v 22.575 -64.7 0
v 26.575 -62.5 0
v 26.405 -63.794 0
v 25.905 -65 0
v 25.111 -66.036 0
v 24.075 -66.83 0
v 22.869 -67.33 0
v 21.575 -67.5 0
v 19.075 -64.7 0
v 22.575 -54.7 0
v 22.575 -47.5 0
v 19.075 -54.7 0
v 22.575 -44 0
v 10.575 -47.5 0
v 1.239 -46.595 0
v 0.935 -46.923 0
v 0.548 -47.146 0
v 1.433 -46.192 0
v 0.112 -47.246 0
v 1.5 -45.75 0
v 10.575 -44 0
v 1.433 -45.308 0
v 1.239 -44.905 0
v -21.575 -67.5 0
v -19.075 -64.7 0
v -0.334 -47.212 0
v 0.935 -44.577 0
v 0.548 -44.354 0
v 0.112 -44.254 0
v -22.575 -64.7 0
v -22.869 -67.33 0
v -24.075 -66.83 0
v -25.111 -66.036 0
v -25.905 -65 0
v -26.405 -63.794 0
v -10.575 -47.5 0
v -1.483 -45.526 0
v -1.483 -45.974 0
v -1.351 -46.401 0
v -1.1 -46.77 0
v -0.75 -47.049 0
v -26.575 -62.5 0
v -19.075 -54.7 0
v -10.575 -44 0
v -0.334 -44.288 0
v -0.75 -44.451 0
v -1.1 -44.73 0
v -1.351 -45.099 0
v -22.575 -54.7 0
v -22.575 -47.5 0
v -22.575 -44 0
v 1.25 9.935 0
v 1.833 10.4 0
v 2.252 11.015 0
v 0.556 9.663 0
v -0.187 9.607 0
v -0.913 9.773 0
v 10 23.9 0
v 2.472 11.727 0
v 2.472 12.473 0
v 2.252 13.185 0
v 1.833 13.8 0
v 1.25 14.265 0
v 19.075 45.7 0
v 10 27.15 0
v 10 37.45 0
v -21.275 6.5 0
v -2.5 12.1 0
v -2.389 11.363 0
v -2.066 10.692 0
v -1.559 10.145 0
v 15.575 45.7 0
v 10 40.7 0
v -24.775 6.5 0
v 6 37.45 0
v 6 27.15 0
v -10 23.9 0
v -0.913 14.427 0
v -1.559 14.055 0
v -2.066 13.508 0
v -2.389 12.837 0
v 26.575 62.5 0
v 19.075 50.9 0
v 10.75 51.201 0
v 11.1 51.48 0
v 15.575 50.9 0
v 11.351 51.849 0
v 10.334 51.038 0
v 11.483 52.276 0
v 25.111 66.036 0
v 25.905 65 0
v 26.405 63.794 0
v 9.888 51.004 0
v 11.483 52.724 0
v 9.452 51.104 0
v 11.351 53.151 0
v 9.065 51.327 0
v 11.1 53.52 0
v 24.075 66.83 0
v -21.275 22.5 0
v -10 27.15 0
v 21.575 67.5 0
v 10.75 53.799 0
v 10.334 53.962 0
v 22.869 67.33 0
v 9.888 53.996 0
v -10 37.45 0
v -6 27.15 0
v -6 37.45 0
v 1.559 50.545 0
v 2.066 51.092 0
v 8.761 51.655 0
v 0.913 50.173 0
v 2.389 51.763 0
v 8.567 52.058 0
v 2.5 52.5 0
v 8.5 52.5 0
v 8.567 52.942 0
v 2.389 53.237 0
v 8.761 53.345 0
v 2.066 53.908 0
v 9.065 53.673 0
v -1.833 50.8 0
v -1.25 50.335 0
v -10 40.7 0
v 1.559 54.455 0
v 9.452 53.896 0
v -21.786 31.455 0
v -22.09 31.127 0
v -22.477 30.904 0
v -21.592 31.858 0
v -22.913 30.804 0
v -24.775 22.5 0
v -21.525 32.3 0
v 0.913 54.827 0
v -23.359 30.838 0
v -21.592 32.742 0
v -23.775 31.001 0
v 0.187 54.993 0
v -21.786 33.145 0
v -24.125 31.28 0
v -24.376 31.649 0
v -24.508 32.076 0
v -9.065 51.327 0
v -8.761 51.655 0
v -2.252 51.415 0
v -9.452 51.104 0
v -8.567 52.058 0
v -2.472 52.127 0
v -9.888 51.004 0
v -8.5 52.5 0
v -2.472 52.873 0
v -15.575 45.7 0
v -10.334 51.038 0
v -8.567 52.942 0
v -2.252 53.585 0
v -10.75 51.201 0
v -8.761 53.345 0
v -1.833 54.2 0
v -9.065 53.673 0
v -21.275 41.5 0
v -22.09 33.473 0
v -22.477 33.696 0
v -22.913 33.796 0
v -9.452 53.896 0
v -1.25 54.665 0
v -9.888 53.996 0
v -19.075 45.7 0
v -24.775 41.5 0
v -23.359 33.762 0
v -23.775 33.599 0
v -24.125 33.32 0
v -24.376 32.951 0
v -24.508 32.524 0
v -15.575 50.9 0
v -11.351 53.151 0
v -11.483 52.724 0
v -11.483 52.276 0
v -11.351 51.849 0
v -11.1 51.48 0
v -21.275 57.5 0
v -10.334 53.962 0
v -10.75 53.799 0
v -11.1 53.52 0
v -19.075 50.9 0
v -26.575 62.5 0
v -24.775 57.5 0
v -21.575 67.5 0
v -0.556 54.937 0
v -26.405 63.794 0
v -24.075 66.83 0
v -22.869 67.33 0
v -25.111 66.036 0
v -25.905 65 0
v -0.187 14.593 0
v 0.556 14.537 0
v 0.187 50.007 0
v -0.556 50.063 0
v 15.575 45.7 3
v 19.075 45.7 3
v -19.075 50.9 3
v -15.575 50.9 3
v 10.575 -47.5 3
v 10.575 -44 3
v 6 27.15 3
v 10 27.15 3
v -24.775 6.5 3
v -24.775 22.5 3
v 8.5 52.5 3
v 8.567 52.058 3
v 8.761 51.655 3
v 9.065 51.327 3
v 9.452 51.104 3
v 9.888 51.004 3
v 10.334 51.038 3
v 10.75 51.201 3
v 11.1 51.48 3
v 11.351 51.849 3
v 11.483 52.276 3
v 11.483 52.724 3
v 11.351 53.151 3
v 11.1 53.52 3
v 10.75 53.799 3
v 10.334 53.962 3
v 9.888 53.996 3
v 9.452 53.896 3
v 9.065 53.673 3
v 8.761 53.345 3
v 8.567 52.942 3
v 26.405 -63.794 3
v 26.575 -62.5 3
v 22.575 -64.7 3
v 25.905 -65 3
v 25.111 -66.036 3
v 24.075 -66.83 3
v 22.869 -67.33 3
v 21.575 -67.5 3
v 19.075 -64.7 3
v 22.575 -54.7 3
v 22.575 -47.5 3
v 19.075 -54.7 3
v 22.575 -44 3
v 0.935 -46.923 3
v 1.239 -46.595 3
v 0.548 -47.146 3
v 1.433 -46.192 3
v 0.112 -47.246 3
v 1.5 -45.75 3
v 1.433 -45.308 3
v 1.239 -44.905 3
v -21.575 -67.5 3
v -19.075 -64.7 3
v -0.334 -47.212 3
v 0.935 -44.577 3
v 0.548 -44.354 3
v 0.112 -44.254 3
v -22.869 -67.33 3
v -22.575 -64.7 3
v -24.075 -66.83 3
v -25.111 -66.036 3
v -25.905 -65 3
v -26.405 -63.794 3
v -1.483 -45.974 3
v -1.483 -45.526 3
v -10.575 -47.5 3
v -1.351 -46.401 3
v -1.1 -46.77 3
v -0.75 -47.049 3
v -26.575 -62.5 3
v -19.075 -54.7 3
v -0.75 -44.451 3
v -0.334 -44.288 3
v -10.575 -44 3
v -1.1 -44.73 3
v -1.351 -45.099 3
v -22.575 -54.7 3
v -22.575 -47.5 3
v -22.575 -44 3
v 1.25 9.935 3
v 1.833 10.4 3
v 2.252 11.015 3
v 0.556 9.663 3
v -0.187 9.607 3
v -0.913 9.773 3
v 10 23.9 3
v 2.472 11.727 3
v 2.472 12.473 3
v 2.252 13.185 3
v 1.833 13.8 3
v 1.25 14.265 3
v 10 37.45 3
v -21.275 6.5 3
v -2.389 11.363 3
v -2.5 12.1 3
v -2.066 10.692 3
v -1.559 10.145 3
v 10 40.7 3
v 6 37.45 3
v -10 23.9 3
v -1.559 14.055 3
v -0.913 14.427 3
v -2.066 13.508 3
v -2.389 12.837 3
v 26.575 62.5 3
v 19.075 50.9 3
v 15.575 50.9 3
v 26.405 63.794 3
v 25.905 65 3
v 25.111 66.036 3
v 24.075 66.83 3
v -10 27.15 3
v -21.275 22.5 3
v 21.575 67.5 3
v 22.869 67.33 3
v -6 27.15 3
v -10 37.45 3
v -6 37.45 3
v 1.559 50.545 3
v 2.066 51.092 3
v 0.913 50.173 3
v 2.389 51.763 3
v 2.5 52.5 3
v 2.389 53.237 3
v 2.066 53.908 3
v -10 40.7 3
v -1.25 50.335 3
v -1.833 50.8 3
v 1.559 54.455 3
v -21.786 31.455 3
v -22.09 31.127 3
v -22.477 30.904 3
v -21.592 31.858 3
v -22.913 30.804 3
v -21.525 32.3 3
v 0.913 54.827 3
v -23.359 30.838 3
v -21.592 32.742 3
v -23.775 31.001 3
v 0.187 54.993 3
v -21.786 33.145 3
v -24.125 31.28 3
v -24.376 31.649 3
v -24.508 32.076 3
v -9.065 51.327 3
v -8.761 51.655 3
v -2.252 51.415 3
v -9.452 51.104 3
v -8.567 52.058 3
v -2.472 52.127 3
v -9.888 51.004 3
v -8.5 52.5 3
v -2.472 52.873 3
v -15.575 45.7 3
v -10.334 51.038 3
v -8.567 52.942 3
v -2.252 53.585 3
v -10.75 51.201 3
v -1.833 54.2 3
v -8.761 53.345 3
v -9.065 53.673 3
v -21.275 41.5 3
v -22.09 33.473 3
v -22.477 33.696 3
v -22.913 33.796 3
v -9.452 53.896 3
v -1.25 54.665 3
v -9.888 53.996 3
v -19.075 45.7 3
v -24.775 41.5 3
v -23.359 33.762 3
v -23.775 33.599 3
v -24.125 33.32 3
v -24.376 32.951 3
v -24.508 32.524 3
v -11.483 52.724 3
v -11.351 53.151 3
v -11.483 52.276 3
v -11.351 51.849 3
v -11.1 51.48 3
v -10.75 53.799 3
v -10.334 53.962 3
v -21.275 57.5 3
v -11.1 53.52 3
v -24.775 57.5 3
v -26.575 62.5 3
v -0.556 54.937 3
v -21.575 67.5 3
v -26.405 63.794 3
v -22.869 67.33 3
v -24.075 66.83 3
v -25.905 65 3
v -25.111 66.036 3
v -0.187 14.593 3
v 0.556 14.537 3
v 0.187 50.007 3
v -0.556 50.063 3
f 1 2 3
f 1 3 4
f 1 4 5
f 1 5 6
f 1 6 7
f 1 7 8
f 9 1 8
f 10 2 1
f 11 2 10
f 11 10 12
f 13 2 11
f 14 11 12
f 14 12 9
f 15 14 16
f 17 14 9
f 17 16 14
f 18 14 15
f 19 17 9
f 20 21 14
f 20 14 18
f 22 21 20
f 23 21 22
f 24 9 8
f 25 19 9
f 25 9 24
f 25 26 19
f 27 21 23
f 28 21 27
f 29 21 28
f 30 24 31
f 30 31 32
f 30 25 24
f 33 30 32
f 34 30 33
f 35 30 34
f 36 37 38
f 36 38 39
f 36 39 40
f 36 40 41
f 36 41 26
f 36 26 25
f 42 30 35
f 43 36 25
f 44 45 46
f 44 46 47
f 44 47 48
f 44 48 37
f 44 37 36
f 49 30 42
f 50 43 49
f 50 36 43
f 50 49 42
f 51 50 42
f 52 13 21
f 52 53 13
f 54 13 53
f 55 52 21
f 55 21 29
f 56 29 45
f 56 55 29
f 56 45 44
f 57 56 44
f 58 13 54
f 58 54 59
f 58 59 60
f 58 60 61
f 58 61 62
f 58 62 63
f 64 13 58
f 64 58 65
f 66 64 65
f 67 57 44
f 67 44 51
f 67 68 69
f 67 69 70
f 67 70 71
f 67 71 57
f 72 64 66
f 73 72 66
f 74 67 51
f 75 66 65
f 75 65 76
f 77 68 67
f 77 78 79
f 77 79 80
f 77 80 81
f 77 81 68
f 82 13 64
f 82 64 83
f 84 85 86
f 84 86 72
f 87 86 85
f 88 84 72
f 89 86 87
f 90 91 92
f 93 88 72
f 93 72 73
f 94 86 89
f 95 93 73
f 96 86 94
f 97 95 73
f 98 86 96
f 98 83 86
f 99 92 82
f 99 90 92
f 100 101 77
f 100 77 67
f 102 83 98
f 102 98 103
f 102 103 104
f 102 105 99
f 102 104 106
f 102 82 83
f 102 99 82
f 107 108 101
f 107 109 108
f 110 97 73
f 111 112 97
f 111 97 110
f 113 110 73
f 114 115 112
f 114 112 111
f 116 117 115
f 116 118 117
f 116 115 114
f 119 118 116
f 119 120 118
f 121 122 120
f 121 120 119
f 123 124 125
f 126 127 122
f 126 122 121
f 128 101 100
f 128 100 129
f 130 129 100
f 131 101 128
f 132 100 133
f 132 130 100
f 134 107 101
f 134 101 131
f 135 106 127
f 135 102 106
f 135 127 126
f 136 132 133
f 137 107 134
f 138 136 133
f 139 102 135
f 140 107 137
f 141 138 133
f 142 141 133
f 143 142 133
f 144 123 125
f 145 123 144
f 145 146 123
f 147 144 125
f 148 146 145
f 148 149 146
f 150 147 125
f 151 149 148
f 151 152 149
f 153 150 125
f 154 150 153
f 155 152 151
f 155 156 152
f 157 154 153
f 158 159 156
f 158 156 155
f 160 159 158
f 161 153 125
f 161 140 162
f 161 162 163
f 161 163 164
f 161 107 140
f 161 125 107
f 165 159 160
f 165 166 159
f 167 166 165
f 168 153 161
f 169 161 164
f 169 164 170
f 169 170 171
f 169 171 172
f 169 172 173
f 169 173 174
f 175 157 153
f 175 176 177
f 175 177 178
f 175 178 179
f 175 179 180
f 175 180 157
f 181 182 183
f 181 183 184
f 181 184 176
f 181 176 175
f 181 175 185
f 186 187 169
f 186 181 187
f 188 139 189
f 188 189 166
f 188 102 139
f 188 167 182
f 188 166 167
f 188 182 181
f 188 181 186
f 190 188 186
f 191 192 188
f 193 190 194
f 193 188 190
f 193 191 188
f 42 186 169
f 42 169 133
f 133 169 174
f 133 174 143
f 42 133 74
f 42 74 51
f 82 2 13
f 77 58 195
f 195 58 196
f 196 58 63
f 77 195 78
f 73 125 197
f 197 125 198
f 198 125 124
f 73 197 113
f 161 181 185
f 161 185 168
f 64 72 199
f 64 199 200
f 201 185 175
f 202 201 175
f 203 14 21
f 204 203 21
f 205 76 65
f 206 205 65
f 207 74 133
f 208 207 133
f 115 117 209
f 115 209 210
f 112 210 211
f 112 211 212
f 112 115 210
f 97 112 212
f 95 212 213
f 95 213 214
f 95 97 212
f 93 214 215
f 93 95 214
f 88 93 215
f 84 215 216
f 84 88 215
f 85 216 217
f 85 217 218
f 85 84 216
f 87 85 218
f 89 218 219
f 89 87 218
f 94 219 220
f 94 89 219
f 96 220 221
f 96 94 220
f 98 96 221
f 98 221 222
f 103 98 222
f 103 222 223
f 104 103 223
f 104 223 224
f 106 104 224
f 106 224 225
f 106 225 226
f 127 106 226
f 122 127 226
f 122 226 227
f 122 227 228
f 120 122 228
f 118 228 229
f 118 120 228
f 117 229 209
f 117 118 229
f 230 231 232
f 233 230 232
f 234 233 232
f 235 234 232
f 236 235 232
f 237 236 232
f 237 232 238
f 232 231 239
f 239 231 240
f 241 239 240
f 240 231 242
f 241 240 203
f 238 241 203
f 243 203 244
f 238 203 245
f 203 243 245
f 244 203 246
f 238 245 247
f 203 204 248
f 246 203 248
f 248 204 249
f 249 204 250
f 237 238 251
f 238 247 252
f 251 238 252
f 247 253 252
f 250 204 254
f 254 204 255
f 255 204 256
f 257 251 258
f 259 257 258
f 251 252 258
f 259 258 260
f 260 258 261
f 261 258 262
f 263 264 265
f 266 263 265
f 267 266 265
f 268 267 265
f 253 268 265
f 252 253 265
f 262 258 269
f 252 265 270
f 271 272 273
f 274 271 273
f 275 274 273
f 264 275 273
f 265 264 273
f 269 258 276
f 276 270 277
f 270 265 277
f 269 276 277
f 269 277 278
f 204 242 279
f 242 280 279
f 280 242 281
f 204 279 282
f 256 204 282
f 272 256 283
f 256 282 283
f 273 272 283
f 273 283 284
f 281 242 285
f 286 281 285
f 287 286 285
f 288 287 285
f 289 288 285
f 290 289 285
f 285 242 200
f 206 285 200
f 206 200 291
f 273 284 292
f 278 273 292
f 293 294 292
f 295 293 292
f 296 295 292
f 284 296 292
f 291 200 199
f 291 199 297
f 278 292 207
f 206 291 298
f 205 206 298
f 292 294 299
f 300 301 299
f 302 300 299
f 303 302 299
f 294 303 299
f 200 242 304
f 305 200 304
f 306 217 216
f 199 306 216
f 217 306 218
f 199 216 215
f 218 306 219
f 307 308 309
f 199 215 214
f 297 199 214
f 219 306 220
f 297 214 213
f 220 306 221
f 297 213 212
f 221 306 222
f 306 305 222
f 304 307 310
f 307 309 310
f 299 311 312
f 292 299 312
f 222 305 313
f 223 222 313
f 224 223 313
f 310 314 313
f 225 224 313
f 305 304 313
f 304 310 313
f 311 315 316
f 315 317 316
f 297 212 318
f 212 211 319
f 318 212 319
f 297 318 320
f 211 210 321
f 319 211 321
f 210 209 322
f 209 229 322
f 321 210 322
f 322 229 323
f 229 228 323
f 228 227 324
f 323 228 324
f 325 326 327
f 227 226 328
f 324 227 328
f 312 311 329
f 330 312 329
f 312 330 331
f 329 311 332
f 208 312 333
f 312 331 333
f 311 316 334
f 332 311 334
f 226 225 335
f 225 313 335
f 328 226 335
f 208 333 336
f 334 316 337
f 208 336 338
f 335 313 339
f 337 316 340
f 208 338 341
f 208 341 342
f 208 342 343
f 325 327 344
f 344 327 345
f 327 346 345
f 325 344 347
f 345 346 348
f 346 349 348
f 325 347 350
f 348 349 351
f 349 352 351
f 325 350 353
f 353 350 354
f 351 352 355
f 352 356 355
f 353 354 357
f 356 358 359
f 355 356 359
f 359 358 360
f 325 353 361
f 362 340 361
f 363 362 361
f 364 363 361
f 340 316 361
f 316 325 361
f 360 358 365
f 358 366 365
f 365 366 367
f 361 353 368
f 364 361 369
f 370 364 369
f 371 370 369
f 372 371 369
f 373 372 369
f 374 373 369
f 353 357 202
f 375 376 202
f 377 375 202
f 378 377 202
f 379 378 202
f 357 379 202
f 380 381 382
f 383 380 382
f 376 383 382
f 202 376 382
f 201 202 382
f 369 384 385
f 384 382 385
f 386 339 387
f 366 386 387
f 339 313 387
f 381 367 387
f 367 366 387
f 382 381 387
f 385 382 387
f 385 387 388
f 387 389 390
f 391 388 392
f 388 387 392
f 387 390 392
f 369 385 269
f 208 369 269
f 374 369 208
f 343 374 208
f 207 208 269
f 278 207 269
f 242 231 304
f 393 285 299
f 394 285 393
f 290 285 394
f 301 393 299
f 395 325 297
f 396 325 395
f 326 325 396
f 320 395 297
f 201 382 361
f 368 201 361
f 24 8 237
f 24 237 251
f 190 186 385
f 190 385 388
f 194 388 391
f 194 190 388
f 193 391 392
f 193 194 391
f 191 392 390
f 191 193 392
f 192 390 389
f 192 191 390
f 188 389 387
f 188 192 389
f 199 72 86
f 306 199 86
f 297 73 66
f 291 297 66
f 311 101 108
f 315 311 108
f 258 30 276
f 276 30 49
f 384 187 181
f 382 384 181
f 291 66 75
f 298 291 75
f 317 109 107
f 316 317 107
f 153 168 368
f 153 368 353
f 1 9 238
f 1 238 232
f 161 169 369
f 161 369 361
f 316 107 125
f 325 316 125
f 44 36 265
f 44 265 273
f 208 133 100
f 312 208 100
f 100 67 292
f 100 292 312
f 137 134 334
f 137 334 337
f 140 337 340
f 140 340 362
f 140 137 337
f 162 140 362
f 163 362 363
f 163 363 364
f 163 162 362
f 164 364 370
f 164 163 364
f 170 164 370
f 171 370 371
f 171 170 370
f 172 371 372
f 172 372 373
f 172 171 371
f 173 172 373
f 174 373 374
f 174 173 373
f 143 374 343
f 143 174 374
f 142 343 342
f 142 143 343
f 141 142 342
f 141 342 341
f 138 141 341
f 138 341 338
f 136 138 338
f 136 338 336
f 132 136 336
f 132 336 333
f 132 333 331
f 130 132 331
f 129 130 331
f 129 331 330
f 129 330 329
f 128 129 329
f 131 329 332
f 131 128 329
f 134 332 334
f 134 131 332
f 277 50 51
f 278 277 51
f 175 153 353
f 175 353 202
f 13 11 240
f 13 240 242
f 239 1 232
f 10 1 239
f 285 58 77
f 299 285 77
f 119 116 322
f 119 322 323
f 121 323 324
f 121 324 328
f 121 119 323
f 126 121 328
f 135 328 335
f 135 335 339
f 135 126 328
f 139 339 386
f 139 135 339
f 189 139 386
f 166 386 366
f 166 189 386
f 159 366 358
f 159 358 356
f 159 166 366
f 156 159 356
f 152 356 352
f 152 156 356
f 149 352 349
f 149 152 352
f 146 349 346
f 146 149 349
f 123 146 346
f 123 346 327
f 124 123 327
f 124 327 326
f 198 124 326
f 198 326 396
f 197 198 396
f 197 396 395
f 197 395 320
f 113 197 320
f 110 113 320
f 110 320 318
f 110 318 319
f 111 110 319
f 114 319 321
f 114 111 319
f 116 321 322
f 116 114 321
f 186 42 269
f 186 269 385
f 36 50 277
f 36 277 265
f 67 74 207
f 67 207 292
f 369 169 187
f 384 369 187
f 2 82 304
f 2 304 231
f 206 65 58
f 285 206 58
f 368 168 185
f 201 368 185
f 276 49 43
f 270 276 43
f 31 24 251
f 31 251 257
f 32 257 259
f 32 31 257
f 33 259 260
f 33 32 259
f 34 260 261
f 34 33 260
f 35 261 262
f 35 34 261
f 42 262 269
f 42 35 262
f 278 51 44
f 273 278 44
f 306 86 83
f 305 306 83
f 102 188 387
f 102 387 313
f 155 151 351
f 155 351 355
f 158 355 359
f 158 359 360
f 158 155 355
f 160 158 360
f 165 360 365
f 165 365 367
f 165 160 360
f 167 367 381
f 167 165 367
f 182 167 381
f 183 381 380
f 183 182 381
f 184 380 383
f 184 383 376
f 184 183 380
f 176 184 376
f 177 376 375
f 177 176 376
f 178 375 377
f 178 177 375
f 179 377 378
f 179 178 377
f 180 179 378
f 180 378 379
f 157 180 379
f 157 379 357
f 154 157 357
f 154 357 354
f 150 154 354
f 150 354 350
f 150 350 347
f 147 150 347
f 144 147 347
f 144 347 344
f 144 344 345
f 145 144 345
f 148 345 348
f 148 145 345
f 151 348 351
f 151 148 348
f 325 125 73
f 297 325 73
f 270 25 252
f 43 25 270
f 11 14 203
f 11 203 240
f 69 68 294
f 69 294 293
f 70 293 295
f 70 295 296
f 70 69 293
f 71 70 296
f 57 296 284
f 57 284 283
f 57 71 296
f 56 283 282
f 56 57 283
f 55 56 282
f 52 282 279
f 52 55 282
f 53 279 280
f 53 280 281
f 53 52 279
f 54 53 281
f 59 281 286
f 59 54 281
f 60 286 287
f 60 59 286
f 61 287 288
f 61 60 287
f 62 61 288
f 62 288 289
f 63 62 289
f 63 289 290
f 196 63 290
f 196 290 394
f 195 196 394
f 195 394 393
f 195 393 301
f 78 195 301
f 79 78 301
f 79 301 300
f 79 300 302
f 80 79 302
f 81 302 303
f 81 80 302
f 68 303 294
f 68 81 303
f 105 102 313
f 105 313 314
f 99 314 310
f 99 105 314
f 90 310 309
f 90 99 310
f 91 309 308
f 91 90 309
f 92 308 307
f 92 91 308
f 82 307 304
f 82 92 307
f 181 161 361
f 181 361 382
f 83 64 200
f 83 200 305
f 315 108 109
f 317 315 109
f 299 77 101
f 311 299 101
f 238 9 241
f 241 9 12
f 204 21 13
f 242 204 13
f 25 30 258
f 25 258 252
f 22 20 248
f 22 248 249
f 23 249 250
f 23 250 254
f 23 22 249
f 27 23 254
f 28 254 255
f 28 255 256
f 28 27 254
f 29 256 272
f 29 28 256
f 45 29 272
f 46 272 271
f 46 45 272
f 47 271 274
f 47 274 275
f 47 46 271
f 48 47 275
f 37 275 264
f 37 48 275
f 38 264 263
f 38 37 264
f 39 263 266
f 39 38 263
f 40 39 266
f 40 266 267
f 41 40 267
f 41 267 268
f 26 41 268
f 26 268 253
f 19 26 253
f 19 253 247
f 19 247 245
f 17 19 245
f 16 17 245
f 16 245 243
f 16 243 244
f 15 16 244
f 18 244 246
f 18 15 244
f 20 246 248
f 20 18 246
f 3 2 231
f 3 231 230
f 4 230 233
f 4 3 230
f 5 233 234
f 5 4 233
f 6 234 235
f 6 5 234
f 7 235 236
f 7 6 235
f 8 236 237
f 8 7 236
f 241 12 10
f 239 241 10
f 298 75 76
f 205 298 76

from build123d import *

# Parameters (mm, degrees)
CROQUIS1_R              = 1.5
CROQUIS1_R_2            = 2.5
CROQUIS1_W              = 12
CROQUIS1_H              = 3.5
CROQUIS1_W_2            = 3.5
CROQUIS1_H_2            = 10
CROQUIS1_H_3            = 16
CROQUIS1_H_4            = 5.2
SALIENTE_EXTRUIR1_DEPTH = 3


with BuildPart() as part:
    # Croquis1 → Saliente-Extruir1 (new body)
    with BuildSketch(Plane.XY):
        with BuildLine():
            Line((21.575, -67.5), (-21.575, -67.5))
            ThreePointArc((-21.575, -67.5), (-25.110533906, -66.035533906), (-26.575, -62.5))
            Line((-26.575, -62.5), (-26.575, 62.5))
            ThreePointArc((-26.575, 62.5), (-25.110533906, 66.035533906), (-21.575, 67.5))
            Line((-21.575, 67.5), (21.575, 67.5))
            ThreePointArc((21.575, 67.5), (25.110533906, 66.035533906), (26.575, 62.5))
            Line((26.575, 62.5), (26.575, -62.5))
            ThreePointArc((26.575, -62.5), (25.110533906, -66.035533906), (21.575, -67.5))
        make_face()
        with Locations((0, -45.75)):
            Circle(CROQUIS1_R, mode=Mode.SUBTRACT)
        with Locations((-23.025, 32.3)):
            Circle(CROQUIS1_R, mode=Mode.SUBTRACT)
        with Locations((0, 52.5)):
            Circle(CROQUIS1_R_2, mode=Mode.SUBTRACT)
        with Locations((-10, 52.5)):
            Circle(CROQUIS1_R, mode=Mode.SUBTRACT)
        with Locations(Location((10, 52.5, 0), (0, 0, 180))):
            Circle(CROQUIS1_R, mode=Mode.SUBTRACT)
        with Locations(Location((0, 12.1, 0), (0, 0, 180))):
            Circle(CROQUIS1_R_2, mode=Mode.SUBTRACT)
        with Locations((-16.575, -45.75)):
            Rectangle(CROQUIS1_W, CROQUIS1_H, mode=Mode.SUBTRACT)
        with Locations((20.825, -59.7)):
            Rectangle(CROQUIS1_W_2, CROQUIS1_H_2, mode=Mode.SUBTRACT)
        with Locations((16.575, -45.75)):
            Rectangle(CROQUIS1_W, CROQUIS1_H, mode=Mode.SUBTRACT)
        with Locations((-20.825, -59.7)):
            Rectangle(CROQUIS1_W_2, CROQUIS1_H_2, mode=Mode.SUBTRACT)
        Polygon((10, 23.9), (-10, 23.9), (-10, 27.15), (-6, 27.15), (-6, 37.45), (-10, 37.45), (-10, 40.7), (10, 40.7), (10, 37.45), (6, 37.45), (6, 27.15), (10, 27.15), align=None, mode=Mode.SUBTRACT)
        with Locations((-23.025, 49.5)):
            Rectangle(CROQUIS1_W_2, CROQUIS1_H_3, mode=Mode.SUBTRACT)
        with Locations((-23.025, 14.5)):
            Rectangle(CROQUIS1_W_2, CROQUIS1_H_3, mode=Mode.SUBTRACT)
        with Locations((17.325, 48.3)):
            Rectangle(CROQUIS1_W_2, CROQUIS1_H_4, mode=Mode.SUBTRACT)
        with Locations((-17.325, 48.3)):
            Rectangle(CROQUIS1_W_2, CROQUIS1_H_4, mode=Mode.SUBTRACT)
    extrude(amount=SALIENTE_EXTRUIR1_DEPTH)


solid = part.part
